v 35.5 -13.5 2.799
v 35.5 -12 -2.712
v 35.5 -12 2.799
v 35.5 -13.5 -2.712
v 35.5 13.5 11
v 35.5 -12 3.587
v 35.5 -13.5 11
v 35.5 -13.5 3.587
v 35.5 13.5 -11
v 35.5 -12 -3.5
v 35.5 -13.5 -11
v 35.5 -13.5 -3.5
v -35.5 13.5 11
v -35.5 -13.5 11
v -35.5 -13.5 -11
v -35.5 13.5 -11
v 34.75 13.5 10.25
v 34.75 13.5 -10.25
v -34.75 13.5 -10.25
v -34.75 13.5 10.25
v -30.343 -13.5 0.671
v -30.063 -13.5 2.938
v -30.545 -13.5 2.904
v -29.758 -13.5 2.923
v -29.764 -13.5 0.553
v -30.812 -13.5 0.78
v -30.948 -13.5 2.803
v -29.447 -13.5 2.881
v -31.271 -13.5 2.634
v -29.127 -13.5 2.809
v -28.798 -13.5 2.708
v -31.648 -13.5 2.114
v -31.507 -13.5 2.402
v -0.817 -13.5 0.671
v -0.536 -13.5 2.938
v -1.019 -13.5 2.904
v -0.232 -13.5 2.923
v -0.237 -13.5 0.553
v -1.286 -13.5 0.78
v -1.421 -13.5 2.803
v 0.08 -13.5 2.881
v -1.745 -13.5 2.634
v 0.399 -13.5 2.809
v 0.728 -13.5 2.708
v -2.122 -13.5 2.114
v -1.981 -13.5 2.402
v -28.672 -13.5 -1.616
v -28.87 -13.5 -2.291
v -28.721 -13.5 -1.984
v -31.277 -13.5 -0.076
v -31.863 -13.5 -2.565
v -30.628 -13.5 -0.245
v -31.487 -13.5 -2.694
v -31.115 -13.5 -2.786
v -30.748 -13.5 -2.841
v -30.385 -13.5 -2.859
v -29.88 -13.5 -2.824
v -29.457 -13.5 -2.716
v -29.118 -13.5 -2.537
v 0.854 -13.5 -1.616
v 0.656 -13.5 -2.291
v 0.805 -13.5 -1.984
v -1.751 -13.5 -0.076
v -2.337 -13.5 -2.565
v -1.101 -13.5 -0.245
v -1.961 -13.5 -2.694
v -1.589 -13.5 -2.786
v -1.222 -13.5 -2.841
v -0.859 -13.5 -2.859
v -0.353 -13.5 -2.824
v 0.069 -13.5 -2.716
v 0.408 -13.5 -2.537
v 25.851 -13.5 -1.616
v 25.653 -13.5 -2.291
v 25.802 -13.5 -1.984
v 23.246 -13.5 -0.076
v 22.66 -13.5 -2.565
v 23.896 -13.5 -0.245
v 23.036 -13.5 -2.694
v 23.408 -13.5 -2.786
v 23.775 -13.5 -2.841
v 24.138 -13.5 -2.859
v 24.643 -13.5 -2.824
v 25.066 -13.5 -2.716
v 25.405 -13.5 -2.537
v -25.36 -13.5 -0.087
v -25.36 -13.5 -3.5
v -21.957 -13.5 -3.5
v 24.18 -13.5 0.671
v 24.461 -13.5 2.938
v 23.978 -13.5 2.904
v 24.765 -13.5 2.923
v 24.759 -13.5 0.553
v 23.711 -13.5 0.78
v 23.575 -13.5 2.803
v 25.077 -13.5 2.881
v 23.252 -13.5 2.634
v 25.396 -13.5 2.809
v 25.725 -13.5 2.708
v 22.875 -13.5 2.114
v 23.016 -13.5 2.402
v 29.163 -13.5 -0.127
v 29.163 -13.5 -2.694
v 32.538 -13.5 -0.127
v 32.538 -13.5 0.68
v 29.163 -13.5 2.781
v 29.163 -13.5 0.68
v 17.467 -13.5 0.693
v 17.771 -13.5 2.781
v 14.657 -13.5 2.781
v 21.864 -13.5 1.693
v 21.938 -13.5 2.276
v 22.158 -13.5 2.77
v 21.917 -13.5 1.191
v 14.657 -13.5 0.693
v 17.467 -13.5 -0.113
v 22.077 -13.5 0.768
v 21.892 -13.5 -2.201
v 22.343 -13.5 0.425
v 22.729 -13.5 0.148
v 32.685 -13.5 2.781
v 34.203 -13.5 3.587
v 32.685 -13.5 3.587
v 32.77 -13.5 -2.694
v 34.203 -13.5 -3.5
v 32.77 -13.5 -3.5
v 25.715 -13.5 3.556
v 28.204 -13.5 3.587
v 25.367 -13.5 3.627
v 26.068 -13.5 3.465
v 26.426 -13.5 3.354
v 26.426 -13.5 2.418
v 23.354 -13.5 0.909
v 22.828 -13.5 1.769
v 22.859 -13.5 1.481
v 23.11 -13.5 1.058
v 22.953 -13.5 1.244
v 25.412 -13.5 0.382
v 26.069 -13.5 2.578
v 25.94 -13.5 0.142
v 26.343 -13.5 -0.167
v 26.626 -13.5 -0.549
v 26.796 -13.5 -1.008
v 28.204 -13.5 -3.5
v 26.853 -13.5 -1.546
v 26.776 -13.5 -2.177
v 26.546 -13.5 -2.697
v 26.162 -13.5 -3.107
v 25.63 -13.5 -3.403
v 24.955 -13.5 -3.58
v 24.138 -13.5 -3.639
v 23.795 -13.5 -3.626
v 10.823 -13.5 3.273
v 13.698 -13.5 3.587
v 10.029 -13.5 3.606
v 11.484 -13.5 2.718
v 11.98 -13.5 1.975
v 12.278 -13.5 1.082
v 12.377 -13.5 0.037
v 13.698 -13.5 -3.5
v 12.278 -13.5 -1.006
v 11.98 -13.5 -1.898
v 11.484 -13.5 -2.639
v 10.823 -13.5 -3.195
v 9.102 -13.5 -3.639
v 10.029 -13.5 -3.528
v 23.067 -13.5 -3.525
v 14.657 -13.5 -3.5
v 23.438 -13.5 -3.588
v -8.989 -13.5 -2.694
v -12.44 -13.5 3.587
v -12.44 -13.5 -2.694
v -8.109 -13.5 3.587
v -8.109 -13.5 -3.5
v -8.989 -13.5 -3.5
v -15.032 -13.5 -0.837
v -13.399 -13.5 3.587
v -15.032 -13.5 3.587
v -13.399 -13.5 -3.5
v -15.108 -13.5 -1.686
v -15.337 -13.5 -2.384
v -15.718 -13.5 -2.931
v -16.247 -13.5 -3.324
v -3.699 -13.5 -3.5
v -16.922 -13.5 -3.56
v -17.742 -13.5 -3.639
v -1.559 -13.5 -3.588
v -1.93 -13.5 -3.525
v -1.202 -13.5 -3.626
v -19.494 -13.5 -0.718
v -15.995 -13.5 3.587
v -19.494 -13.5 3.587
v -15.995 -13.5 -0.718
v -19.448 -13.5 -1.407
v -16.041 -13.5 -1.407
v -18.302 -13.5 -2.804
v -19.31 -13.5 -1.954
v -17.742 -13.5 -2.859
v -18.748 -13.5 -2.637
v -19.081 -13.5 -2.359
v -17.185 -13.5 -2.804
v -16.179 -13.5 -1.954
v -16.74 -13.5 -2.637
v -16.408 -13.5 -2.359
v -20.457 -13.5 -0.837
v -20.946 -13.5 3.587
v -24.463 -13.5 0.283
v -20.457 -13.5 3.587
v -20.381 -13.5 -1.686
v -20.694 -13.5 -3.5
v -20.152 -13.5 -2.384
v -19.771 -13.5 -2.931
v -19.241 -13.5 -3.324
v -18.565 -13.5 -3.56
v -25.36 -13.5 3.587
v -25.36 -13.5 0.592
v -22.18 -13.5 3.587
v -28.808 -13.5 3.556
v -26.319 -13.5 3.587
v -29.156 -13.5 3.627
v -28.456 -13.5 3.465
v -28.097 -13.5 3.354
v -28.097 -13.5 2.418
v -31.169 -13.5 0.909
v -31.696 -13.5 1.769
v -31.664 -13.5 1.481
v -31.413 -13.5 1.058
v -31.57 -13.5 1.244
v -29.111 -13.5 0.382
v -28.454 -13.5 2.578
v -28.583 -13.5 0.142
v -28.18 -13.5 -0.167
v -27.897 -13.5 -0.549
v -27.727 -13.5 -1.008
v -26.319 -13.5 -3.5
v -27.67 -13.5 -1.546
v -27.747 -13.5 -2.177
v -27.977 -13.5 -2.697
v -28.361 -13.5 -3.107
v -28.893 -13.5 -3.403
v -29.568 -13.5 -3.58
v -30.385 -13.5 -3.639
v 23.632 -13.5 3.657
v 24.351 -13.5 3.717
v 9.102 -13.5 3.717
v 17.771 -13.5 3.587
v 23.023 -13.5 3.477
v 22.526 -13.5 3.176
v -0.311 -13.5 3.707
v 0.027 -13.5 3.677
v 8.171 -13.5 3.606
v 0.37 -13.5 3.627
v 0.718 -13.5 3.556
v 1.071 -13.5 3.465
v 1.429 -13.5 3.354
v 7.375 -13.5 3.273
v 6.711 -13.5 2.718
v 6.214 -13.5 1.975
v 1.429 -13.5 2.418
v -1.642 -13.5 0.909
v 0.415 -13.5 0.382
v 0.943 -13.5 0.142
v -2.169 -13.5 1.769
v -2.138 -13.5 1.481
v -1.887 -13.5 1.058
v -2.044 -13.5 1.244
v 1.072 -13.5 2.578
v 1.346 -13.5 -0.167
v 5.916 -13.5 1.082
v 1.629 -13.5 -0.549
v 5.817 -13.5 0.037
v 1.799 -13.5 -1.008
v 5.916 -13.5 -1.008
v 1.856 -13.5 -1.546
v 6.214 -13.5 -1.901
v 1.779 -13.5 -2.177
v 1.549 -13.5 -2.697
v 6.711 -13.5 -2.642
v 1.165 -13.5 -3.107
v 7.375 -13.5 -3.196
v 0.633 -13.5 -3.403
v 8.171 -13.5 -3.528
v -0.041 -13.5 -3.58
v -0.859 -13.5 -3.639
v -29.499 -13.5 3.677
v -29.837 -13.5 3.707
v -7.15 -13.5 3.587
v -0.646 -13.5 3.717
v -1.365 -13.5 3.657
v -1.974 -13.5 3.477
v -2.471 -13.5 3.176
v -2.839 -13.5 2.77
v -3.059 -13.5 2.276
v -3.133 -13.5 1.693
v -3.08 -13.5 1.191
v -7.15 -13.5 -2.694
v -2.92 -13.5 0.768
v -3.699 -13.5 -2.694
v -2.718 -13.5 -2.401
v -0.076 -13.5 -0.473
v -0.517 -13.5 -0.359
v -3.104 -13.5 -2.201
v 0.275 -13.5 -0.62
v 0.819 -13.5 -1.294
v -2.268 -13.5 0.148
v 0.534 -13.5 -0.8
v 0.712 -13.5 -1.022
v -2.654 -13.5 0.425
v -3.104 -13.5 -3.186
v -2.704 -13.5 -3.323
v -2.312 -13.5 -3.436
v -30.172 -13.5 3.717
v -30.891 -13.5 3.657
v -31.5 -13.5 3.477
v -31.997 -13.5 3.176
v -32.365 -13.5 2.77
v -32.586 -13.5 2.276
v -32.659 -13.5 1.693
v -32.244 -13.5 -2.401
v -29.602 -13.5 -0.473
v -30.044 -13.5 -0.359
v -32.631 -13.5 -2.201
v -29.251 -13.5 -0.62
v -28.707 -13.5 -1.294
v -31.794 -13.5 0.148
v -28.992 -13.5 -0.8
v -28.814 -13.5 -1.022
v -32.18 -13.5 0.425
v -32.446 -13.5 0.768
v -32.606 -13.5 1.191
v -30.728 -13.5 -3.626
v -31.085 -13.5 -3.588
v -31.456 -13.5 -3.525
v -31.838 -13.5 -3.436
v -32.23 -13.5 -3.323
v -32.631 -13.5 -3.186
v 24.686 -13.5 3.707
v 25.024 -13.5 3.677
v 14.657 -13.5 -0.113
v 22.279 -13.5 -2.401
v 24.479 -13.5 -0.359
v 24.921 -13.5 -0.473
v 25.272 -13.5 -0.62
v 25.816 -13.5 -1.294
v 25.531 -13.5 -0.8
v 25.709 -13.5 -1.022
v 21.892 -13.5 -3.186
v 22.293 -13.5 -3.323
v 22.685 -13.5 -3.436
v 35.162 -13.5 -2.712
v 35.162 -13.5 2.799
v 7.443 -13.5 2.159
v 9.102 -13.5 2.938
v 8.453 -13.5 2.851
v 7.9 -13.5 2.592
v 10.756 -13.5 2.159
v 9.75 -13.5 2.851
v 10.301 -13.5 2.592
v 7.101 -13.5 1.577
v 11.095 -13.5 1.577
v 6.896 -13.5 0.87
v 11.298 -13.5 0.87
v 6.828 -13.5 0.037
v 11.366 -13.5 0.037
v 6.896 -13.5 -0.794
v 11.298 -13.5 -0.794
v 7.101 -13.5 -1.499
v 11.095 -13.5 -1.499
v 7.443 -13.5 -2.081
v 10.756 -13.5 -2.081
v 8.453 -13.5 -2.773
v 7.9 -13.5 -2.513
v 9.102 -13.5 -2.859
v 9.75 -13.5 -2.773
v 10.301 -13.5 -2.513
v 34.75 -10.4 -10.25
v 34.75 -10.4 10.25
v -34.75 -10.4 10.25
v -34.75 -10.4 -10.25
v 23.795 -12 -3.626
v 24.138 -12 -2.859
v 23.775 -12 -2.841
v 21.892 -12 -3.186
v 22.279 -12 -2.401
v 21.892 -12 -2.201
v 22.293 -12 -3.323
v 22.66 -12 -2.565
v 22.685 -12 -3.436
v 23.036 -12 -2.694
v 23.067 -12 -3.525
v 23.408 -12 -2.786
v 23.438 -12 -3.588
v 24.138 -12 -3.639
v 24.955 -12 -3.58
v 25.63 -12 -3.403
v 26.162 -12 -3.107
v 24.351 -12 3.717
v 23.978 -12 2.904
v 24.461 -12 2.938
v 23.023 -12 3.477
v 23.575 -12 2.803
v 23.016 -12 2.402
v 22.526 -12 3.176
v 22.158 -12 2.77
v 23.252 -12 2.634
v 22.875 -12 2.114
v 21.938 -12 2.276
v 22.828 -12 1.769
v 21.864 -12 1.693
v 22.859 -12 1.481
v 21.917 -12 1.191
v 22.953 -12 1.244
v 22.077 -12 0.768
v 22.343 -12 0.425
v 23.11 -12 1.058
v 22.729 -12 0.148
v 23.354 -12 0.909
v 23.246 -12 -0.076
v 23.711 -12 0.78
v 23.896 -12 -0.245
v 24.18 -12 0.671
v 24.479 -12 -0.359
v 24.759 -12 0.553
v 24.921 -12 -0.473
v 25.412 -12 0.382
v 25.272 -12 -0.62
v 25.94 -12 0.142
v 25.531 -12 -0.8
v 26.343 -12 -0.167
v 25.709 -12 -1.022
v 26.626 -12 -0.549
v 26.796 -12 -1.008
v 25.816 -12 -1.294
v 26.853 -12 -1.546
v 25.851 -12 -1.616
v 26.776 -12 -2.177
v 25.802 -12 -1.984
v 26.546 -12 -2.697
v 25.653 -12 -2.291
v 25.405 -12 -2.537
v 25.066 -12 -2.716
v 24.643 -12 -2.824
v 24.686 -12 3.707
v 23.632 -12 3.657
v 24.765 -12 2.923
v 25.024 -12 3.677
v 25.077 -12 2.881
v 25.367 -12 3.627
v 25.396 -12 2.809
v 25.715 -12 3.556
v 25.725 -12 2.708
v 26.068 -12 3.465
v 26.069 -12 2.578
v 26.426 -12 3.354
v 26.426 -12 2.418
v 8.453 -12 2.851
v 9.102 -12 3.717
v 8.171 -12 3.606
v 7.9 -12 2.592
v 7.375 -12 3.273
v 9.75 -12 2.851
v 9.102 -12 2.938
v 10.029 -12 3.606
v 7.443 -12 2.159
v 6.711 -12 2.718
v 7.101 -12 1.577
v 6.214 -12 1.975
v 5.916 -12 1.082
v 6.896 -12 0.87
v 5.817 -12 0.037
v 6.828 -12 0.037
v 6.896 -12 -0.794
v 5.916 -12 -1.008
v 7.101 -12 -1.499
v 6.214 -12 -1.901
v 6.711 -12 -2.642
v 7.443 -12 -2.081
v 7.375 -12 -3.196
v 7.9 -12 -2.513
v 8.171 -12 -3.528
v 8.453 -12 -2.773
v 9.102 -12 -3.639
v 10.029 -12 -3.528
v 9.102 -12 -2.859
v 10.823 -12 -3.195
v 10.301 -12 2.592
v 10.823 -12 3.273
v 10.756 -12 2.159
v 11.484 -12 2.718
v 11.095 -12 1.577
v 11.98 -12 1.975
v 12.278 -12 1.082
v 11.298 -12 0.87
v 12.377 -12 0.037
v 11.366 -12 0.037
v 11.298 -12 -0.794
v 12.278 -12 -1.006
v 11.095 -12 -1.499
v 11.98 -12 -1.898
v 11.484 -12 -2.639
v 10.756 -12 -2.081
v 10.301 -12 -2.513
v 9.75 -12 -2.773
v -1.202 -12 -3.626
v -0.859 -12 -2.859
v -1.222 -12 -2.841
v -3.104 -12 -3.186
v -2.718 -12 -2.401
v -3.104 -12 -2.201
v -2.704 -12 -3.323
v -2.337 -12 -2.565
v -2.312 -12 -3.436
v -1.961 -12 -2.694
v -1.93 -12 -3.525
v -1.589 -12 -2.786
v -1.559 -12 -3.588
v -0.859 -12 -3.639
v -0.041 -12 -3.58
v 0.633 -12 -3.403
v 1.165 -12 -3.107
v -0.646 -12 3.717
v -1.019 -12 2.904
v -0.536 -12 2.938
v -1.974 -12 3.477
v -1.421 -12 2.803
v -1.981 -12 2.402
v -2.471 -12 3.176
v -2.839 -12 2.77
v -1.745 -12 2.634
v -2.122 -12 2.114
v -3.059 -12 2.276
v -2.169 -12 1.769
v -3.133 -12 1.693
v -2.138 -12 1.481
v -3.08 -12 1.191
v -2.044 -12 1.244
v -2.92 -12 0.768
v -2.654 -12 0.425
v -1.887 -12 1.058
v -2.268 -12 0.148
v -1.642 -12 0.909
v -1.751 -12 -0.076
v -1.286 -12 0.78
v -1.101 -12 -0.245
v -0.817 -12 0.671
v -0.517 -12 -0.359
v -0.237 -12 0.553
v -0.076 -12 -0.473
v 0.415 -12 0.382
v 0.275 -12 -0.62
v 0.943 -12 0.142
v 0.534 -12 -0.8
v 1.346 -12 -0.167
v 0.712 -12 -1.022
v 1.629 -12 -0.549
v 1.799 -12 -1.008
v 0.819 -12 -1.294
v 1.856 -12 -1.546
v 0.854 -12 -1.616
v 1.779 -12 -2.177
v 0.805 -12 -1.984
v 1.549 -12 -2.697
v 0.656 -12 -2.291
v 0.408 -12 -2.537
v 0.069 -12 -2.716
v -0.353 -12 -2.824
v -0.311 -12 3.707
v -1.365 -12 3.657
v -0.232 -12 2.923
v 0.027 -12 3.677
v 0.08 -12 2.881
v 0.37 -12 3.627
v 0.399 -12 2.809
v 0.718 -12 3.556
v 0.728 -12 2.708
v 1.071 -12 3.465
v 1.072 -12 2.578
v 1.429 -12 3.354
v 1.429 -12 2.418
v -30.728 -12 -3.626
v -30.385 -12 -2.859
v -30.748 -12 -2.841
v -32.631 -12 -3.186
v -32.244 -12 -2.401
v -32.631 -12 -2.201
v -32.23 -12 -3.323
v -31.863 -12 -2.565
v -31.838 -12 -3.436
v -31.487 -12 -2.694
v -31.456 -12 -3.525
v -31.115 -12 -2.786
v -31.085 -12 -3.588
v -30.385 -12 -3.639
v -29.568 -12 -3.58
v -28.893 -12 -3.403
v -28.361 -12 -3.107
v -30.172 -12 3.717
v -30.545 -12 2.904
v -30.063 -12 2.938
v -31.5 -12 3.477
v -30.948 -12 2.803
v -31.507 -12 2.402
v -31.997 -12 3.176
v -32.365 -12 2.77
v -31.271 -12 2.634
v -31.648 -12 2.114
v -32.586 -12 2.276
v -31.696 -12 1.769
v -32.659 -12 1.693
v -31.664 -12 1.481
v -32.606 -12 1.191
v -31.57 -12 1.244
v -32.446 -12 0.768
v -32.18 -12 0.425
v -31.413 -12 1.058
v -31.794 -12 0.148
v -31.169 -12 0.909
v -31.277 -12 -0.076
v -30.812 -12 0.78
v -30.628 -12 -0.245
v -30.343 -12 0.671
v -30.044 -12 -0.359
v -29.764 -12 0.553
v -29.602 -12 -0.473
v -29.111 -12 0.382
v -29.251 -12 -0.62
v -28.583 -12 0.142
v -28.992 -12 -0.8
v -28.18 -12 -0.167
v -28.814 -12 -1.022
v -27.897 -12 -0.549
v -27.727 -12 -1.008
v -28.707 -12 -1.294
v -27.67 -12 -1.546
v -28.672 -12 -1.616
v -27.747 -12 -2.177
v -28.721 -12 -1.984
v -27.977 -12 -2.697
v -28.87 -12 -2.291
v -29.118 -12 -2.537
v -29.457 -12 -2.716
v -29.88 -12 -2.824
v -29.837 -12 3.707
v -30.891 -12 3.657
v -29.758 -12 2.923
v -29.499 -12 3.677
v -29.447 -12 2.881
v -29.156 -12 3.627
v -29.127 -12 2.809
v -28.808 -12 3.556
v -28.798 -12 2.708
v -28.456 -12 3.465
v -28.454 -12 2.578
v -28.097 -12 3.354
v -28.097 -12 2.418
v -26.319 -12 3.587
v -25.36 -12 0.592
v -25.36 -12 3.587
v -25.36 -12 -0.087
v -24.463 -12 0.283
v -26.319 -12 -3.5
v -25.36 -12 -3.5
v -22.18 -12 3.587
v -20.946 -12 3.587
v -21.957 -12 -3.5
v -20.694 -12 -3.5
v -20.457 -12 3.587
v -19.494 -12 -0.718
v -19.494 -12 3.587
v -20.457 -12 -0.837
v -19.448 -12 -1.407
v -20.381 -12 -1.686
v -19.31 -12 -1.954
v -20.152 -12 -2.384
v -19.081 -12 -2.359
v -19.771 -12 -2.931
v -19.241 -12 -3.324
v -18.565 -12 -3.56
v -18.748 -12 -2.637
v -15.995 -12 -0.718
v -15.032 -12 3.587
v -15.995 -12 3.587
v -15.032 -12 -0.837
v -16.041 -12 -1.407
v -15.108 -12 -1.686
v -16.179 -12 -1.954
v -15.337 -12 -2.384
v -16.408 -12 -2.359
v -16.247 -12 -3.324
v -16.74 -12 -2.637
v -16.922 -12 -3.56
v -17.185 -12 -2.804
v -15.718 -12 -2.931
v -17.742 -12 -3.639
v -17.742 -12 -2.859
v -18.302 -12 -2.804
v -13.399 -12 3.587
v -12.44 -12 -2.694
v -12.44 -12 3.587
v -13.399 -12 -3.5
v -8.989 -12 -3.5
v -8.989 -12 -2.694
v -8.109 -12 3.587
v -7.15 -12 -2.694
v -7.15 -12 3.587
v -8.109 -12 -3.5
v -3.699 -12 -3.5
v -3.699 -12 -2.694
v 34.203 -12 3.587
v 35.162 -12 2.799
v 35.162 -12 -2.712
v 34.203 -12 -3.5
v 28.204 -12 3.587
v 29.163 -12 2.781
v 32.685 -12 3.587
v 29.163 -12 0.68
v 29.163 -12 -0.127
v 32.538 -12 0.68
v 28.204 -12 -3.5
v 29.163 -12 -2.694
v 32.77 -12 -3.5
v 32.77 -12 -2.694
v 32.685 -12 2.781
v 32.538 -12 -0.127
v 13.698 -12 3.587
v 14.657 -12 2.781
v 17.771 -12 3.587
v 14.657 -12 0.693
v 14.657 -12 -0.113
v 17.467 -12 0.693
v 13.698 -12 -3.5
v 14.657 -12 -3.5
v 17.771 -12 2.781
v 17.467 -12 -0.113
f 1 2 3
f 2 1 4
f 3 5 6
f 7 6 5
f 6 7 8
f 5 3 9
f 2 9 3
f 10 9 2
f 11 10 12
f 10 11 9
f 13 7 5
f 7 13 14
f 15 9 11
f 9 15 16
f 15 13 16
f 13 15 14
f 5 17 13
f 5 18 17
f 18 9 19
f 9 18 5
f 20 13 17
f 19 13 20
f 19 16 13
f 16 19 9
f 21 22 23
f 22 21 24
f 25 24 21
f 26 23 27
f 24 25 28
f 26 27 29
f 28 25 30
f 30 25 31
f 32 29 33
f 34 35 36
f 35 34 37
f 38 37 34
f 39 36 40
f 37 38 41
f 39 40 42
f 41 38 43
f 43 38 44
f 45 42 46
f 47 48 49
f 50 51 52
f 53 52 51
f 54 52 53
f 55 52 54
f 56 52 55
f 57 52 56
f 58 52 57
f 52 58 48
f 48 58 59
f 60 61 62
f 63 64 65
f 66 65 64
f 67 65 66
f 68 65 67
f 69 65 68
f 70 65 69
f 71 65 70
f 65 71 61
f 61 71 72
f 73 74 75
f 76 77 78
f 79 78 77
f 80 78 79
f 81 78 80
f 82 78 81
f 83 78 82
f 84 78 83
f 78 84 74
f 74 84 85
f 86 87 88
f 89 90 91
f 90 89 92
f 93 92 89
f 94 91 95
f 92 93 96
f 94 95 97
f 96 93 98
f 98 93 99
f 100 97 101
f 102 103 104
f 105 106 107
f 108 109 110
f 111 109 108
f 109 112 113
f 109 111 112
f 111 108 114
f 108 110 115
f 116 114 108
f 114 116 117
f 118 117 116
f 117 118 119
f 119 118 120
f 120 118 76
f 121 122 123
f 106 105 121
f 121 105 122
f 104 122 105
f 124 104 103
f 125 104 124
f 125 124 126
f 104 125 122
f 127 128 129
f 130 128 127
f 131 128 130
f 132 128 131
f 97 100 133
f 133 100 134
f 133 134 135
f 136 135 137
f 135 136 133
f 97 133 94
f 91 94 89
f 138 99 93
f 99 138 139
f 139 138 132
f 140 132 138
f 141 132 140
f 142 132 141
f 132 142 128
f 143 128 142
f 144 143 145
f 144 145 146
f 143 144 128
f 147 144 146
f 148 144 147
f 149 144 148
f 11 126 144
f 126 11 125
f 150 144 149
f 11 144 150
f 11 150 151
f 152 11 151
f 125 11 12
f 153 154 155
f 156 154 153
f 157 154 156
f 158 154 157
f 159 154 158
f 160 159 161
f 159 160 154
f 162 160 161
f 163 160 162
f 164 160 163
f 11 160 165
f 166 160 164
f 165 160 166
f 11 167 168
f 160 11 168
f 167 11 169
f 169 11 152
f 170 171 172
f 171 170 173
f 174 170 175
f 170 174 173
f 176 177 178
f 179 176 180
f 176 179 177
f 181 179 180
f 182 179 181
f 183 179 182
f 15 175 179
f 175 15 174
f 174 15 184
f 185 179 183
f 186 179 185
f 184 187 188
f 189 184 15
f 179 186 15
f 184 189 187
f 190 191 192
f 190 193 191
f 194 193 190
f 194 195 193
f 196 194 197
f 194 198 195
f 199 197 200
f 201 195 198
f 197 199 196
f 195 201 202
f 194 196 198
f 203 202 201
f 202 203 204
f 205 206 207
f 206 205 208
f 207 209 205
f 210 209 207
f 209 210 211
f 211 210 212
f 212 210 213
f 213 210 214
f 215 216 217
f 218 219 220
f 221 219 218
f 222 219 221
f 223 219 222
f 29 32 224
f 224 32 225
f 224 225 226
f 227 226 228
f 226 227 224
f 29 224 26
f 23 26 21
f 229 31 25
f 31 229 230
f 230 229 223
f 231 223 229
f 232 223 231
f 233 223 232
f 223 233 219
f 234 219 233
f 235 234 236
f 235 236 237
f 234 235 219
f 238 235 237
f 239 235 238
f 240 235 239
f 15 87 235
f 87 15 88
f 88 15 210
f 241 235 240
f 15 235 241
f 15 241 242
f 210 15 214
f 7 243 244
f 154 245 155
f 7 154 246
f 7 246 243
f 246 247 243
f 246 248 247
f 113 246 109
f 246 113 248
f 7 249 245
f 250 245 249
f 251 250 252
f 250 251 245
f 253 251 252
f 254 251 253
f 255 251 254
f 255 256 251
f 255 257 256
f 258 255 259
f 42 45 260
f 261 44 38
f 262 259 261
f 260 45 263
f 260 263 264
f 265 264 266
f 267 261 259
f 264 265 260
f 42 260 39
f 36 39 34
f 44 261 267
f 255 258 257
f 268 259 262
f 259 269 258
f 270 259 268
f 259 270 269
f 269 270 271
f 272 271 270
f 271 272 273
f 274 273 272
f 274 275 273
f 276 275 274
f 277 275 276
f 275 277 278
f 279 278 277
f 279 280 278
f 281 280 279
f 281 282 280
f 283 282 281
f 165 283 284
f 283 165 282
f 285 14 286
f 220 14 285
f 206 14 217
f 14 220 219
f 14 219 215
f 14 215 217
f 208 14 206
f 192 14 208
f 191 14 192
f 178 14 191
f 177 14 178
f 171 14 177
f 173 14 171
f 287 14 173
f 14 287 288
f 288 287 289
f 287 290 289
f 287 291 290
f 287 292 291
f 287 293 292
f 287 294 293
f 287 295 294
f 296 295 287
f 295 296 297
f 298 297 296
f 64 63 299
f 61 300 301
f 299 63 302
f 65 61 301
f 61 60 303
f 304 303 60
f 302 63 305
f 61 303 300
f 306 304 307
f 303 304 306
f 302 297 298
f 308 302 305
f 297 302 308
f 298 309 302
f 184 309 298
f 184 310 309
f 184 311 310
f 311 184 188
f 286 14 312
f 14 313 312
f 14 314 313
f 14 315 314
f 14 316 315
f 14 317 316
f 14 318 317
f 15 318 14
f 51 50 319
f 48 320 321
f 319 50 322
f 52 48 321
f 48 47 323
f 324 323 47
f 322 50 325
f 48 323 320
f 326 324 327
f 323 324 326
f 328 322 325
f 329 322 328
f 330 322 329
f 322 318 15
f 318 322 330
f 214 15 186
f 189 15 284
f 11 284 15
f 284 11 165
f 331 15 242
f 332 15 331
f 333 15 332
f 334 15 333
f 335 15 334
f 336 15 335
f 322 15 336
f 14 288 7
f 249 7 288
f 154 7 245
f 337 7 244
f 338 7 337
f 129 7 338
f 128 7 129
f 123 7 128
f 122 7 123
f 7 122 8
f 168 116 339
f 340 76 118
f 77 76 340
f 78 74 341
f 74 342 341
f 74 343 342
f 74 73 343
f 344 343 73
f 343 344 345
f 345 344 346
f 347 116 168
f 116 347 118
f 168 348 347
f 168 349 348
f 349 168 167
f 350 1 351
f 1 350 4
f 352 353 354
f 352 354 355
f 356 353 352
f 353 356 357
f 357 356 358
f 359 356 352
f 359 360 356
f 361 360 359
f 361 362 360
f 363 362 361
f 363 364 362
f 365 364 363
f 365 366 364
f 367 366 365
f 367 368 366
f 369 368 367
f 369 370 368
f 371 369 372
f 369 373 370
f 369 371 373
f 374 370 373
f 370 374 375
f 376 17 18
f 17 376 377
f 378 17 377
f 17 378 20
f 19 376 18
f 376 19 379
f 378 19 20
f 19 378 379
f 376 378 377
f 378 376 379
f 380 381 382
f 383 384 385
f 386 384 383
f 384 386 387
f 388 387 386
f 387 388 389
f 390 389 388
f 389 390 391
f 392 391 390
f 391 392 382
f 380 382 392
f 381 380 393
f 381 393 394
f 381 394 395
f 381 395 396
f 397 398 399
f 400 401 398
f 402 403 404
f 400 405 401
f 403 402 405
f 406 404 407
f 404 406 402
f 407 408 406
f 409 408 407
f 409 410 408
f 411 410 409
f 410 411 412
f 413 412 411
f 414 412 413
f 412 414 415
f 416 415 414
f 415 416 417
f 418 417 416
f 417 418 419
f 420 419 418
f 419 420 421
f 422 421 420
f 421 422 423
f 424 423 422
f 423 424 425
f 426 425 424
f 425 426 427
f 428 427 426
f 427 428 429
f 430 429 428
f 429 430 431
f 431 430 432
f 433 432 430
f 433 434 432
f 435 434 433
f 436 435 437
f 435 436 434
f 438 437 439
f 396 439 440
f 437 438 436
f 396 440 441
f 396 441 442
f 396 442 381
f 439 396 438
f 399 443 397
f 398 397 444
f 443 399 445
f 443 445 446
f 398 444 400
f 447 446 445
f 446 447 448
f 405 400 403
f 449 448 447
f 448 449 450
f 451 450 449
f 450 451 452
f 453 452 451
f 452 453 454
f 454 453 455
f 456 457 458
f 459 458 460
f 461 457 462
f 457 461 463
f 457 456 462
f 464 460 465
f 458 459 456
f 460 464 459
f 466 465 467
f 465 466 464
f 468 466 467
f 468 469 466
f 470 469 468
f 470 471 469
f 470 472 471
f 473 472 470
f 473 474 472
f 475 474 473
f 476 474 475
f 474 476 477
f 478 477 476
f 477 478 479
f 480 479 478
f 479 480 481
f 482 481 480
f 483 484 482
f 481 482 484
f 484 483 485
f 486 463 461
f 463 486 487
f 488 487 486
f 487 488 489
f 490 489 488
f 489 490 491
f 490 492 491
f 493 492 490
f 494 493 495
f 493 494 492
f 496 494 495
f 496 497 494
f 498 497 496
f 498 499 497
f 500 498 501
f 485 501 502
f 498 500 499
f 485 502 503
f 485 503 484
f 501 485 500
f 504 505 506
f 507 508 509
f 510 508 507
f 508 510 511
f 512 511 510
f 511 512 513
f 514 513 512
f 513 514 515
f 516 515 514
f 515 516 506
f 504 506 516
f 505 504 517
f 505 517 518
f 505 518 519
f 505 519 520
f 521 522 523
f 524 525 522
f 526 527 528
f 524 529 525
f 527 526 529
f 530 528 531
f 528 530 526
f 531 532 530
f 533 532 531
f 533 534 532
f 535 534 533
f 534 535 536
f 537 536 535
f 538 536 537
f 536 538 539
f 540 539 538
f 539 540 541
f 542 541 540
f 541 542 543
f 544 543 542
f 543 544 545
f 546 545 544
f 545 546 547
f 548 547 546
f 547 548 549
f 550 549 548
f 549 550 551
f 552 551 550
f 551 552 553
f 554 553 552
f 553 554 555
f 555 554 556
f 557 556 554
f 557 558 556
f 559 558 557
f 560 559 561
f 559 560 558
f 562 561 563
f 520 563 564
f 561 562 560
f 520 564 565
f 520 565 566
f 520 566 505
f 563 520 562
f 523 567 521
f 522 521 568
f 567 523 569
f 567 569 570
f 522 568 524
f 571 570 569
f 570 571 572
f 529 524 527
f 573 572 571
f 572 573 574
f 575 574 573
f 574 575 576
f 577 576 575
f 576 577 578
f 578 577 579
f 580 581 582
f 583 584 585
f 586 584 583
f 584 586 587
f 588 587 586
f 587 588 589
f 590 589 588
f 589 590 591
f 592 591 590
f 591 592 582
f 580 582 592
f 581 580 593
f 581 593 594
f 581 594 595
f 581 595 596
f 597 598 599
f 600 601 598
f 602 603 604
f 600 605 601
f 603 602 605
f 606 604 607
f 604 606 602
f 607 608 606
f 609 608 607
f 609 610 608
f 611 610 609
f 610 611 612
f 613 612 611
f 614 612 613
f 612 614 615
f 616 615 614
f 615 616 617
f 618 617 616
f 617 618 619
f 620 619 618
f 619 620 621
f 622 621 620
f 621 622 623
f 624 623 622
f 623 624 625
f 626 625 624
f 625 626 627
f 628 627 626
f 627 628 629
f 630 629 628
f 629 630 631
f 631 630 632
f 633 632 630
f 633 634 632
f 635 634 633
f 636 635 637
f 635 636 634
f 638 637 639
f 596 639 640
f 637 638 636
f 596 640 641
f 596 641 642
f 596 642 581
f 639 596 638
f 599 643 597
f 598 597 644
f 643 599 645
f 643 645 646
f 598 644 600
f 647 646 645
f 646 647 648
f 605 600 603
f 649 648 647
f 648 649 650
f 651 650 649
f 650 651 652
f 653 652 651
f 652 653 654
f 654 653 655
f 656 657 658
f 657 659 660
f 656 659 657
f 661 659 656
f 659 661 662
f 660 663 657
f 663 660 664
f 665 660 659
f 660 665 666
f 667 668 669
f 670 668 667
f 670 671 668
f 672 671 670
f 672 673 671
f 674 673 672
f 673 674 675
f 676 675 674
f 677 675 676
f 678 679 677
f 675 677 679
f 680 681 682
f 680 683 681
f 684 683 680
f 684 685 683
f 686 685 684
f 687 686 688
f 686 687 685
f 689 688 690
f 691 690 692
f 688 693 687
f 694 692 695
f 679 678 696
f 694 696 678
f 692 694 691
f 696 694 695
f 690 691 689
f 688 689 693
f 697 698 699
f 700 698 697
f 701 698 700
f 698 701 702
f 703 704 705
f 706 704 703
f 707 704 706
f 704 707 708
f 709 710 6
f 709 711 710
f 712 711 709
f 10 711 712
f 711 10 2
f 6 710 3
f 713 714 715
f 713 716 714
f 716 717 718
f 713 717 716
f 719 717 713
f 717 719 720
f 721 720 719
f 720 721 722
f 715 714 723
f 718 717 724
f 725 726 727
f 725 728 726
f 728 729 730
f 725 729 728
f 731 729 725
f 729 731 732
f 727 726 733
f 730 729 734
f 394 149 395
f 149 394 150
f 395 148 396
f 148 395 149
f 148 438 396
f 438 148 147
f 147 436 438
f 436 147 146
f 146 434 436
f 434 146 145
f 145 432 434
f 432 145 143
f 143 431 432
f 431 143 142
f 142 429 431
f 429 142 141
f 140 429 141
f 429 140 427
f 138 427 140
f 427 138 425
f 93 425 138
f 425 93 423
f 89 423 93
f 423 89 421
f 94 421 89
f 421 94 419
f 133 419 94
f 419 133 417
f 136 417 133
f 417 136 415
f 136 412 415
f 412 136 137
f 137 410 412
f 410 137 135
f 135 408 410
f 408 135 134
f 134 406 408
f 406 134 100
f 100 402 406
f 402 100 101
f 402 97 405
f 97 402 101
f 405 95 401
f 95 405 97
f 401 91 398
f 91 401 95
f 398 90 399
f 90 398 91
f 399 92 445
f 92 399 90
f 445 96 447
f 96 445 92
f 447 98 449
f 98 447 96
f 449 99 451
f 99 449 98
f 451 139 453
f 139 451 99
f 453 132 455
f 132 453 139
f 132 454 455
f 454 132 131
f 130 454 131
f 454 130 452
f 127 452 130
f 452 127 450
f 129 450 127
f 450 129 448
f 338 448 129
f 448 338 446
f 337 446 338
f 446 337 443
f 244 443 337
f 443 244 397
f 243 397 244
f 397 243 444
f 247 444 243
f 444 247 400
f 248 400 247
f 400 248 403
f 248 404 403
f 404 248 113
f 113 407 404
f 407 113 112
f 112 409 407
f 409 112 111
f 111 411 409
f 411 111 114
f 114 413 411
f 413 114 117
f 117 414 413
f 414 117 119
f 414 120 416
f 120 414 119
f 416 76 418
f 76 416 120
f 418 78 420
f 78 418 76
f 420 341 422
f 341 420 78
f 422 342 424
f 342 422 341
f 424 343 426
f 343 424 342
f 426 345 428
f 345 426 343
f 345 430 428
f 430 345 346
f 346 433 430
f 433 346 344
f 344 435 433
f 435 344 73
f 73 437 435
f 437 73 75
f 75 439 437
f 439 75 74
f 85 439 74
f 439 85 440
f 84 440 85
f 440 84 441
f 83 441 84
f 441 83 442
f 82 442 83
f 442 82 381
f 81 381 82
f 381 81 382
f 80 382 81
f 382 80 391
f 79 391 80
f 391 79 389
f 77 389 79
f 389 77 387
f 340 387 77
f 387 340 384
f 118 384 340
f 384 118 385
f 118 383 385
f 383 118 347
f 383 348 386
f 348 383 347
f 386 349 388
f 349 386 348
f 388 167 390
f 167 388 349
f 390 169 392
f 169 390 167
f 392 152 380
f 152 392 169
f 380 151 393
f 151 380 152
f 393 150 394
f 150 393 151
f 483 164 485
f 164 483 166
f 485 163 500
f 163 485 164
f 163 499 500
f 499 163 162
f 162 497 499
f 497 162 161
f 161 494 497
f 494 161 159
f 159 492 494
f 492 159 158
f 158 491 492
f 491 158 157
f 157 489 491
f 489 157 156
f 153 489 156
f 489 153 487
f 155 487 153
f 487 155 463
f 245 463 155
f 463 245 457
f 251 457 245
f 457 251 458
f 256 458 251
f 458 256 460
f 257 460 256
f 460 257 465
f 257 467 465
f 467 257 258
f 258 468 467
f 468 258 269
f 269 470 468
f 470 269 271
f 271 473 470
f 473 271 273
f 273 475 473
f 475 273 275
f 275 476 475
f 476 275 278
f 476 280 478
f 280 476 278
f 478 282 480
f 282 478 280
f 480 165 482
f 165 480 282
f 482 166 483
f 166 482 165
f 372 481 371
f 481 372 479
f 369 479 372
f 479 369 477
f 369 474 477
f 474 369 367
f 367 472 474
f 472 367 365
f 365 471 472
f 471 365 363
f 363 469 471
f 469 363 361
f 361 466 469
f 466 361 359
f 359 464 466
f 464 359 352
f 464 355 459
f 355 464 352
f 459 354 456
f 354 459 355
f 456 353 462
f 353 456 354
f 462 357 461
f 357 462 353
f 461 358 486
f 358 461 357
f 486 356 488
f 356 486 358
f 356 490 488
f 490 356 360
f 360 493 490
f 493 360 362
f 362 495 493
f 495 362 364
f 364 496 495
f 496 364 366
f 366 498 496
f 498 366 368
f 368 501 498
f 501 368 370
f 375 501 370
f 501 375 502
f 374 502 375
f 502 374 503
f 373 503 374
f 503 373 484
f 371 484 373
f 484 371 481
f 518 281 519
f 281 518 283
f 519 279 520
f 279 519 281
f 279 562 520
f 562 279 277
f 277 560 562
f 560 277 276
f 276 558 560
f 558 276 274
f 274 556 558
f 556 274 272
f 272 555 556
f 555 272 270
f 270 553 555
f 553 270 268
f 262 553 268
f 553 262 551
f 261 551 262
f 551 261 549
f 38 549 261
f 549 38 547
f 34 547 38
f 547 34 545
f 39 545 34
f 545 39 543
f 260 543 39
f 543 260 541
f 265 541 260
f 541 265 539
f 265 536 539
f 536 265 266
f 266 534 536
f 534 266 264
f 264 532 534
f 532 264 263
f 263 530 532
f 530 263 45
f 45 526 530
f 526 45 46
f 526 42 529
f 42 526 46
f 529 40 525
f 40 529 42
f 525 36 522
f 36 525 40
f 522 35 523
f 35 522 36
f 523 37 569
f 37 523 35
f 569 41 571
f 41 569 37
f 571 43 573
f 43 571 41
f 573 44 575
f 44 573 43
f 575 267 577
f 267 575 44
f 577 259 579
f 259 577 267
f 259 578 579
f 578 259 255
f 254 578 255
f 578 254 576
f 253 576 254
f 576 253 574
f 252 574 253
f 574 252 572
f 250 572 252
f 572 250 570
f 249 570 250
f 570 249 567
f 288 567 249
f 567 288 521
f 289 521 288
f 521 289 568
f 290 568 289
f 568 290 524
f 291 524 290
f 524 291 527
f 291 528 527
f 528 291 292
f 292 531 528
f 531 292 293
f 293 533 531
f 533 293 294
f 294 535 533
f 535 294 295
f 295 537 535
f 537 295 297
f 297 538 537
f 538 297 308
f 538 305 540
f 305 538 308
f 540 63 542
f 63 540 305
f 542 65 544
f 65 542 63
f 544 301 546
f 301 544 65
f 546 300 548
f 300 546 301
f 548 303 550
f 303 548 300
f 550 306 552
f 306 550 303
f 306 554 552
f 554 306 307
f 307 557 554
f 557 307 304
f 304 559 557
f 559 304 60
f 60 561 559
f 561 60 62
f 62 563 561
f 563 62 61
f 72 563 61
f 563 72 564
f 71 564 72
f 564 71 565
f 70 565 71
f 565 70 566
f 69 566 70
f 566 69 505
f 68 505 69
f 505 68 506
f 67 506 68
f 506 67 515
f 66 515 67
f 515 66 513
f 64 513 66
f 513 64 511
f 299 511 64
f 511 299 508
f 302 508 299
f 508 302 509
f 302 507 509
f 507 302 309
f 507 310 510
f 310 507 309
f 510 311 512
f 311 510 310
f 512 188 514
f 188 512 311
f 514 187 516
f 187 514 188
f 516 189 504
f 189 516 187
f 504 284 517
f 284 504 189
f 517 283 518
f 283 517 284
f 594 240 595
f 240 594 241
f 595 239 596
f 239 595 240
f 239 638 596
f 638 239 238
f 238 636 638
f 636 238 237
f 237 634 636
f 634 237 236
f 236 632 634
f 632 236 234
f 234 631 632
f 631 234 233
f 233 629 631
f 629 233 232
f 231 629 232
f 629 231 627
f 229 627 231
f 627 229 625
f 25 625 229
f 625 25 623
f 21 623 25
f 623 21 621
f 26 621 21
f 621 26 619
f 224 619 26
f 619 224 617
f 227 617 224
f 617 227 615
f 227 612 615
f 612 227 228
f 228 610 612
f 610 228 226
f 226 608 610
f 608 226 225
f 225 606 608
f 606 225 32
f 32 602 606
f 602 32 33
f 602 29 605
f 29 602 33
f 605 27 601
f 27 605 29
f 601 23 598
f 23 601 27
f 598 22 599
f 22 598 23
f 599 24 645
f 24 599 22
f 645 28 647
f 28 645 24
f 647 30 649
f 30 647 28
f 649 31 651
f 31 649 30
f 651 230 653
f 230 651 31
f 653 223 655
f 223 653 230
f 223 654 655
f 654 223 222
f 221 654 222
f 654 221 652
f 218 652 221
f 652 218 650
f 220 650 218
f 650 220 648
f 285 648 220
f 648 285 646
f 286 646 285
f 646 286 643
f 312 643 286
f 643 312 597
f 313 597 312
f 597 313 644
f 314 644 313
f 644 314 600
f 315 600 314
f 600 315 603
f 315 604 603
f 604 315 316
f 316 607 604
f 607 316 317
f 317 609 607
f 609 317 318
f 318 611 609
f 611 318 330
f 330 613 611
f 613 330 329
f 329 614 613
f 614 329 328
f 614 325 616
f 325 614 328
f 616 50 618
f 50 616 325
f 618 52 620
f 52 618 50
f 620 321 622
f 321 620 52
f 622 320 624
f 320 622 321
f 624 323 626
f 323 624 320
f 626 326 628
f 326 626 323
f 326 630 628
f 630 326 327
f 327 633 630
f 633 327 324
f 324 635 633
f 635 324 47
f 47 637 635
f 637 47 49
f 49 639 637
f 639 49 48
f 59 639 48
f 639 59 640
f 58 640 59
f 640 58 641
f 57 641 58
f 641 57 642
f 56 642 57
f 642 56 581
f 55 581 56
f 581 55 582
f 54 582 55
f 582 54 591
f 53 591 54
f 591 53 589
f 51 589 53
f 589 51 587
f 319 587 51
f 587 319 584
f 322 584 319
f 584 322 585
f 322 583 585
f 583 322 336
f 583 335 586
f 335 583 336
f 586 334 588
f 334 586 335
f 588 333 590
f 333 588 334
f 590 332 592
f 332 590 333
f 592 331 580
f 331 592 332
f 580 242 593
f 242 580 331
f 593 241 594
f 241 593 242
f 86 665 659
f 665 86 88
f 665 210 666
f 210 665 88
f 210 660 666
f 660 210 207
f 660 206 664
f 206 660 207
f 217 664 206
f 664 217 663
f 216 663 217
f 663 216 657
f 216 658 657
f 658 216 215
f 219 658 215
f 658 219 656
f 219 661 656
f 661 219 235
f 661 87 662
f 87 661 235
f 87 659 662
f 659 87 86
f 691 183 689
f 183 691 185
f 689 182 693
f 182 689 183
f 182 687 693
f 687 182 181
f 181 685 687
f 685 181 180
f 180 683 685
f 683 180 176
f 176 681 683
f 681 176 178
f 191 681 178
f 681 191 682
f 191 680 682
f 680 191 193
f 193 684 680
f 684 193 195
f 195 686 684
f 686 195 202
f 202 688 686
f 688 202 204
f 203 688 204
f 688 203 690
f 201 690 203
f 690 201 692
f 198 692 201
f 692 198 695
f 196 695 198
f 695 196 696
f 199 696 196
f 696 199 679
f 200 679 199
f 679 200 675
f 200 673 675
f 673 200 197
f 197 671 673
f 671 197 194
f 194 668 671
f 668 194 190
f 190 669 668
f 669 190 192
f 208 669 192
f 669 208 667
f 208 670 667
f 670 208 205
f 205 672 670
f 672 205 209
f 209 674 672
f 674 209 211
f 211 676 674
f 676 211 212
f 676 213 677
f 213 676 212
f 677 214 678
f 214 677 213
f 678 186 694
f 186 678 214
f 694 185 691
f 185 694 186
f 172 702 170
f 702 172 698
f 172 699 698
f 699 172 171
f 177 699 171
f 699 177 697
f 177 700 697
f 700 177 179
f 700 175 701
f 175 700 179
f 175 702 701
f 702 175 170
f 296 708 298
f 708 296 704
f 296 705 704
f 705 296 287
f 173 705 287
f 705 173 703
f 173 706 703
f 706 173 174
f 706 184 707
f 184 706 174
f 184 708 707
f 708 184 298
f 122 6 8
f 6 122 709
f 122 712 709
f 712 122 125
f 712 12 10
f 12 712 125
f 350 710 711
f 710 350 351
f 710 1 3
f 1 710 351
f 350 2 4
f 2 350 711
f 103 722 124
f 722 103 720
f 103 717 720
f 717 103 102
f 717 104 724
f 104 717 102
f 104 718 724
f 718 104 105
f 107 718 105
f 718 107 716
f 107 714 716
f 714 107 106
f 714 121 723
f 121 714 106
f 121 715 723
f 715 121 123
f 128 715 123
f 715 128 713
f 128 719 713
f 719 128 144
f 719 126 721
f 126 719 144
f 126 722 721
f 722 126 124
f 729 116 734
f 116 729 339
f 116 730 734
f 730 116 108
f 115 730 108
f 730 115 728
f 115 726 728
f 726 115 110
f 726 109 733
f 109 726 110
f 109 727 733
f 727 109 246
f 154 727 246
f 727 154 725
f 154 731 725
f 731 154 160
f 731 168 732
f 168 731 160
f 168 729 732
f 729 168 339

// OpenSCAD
// file: parameters.scad
//parameters
//thickness of box sides
wall = 2;

//width of cards, including sleeves and extra space
crdX = 67;

//length of cards including sleeves and extra space
crdY = 93;                  

//height of the entire pile of cards.  modify if you have more cards
crdZ = 18;

//how much of the main box is tapered to accommodate the lid
lidY = 25;

//the size of the taper
lidDiff = 0.75;

sideFontName="Impact";
sideFontSize=7;
sideFontLeftPadding=2;

//constant to avoid coincident faces.  don't change this
_min=0.1;

//calculated values
trayX = crdX+(2*wall);
trayY = crdY+(2*wall);
trayZ = crdZ+(2*wall);
// main file
include <parameters.scad>


difference(){
cube([trayX, lidY+wall, trayZ],center=true);
    
translate([0,wall+_min,0])
        cube([trayX-(2*lidDiff),lidY,trayZ-(2*lidDiff)],center=true);

    translate([-33.3,-(lidY/2)+.5,-(sideFontSize/2)])
    rotate([90,0,0])
    linear_extrude(2)
    text("SKULLS OF SEDLEC", font=sideFontName, size=sideFontSize);    
}
